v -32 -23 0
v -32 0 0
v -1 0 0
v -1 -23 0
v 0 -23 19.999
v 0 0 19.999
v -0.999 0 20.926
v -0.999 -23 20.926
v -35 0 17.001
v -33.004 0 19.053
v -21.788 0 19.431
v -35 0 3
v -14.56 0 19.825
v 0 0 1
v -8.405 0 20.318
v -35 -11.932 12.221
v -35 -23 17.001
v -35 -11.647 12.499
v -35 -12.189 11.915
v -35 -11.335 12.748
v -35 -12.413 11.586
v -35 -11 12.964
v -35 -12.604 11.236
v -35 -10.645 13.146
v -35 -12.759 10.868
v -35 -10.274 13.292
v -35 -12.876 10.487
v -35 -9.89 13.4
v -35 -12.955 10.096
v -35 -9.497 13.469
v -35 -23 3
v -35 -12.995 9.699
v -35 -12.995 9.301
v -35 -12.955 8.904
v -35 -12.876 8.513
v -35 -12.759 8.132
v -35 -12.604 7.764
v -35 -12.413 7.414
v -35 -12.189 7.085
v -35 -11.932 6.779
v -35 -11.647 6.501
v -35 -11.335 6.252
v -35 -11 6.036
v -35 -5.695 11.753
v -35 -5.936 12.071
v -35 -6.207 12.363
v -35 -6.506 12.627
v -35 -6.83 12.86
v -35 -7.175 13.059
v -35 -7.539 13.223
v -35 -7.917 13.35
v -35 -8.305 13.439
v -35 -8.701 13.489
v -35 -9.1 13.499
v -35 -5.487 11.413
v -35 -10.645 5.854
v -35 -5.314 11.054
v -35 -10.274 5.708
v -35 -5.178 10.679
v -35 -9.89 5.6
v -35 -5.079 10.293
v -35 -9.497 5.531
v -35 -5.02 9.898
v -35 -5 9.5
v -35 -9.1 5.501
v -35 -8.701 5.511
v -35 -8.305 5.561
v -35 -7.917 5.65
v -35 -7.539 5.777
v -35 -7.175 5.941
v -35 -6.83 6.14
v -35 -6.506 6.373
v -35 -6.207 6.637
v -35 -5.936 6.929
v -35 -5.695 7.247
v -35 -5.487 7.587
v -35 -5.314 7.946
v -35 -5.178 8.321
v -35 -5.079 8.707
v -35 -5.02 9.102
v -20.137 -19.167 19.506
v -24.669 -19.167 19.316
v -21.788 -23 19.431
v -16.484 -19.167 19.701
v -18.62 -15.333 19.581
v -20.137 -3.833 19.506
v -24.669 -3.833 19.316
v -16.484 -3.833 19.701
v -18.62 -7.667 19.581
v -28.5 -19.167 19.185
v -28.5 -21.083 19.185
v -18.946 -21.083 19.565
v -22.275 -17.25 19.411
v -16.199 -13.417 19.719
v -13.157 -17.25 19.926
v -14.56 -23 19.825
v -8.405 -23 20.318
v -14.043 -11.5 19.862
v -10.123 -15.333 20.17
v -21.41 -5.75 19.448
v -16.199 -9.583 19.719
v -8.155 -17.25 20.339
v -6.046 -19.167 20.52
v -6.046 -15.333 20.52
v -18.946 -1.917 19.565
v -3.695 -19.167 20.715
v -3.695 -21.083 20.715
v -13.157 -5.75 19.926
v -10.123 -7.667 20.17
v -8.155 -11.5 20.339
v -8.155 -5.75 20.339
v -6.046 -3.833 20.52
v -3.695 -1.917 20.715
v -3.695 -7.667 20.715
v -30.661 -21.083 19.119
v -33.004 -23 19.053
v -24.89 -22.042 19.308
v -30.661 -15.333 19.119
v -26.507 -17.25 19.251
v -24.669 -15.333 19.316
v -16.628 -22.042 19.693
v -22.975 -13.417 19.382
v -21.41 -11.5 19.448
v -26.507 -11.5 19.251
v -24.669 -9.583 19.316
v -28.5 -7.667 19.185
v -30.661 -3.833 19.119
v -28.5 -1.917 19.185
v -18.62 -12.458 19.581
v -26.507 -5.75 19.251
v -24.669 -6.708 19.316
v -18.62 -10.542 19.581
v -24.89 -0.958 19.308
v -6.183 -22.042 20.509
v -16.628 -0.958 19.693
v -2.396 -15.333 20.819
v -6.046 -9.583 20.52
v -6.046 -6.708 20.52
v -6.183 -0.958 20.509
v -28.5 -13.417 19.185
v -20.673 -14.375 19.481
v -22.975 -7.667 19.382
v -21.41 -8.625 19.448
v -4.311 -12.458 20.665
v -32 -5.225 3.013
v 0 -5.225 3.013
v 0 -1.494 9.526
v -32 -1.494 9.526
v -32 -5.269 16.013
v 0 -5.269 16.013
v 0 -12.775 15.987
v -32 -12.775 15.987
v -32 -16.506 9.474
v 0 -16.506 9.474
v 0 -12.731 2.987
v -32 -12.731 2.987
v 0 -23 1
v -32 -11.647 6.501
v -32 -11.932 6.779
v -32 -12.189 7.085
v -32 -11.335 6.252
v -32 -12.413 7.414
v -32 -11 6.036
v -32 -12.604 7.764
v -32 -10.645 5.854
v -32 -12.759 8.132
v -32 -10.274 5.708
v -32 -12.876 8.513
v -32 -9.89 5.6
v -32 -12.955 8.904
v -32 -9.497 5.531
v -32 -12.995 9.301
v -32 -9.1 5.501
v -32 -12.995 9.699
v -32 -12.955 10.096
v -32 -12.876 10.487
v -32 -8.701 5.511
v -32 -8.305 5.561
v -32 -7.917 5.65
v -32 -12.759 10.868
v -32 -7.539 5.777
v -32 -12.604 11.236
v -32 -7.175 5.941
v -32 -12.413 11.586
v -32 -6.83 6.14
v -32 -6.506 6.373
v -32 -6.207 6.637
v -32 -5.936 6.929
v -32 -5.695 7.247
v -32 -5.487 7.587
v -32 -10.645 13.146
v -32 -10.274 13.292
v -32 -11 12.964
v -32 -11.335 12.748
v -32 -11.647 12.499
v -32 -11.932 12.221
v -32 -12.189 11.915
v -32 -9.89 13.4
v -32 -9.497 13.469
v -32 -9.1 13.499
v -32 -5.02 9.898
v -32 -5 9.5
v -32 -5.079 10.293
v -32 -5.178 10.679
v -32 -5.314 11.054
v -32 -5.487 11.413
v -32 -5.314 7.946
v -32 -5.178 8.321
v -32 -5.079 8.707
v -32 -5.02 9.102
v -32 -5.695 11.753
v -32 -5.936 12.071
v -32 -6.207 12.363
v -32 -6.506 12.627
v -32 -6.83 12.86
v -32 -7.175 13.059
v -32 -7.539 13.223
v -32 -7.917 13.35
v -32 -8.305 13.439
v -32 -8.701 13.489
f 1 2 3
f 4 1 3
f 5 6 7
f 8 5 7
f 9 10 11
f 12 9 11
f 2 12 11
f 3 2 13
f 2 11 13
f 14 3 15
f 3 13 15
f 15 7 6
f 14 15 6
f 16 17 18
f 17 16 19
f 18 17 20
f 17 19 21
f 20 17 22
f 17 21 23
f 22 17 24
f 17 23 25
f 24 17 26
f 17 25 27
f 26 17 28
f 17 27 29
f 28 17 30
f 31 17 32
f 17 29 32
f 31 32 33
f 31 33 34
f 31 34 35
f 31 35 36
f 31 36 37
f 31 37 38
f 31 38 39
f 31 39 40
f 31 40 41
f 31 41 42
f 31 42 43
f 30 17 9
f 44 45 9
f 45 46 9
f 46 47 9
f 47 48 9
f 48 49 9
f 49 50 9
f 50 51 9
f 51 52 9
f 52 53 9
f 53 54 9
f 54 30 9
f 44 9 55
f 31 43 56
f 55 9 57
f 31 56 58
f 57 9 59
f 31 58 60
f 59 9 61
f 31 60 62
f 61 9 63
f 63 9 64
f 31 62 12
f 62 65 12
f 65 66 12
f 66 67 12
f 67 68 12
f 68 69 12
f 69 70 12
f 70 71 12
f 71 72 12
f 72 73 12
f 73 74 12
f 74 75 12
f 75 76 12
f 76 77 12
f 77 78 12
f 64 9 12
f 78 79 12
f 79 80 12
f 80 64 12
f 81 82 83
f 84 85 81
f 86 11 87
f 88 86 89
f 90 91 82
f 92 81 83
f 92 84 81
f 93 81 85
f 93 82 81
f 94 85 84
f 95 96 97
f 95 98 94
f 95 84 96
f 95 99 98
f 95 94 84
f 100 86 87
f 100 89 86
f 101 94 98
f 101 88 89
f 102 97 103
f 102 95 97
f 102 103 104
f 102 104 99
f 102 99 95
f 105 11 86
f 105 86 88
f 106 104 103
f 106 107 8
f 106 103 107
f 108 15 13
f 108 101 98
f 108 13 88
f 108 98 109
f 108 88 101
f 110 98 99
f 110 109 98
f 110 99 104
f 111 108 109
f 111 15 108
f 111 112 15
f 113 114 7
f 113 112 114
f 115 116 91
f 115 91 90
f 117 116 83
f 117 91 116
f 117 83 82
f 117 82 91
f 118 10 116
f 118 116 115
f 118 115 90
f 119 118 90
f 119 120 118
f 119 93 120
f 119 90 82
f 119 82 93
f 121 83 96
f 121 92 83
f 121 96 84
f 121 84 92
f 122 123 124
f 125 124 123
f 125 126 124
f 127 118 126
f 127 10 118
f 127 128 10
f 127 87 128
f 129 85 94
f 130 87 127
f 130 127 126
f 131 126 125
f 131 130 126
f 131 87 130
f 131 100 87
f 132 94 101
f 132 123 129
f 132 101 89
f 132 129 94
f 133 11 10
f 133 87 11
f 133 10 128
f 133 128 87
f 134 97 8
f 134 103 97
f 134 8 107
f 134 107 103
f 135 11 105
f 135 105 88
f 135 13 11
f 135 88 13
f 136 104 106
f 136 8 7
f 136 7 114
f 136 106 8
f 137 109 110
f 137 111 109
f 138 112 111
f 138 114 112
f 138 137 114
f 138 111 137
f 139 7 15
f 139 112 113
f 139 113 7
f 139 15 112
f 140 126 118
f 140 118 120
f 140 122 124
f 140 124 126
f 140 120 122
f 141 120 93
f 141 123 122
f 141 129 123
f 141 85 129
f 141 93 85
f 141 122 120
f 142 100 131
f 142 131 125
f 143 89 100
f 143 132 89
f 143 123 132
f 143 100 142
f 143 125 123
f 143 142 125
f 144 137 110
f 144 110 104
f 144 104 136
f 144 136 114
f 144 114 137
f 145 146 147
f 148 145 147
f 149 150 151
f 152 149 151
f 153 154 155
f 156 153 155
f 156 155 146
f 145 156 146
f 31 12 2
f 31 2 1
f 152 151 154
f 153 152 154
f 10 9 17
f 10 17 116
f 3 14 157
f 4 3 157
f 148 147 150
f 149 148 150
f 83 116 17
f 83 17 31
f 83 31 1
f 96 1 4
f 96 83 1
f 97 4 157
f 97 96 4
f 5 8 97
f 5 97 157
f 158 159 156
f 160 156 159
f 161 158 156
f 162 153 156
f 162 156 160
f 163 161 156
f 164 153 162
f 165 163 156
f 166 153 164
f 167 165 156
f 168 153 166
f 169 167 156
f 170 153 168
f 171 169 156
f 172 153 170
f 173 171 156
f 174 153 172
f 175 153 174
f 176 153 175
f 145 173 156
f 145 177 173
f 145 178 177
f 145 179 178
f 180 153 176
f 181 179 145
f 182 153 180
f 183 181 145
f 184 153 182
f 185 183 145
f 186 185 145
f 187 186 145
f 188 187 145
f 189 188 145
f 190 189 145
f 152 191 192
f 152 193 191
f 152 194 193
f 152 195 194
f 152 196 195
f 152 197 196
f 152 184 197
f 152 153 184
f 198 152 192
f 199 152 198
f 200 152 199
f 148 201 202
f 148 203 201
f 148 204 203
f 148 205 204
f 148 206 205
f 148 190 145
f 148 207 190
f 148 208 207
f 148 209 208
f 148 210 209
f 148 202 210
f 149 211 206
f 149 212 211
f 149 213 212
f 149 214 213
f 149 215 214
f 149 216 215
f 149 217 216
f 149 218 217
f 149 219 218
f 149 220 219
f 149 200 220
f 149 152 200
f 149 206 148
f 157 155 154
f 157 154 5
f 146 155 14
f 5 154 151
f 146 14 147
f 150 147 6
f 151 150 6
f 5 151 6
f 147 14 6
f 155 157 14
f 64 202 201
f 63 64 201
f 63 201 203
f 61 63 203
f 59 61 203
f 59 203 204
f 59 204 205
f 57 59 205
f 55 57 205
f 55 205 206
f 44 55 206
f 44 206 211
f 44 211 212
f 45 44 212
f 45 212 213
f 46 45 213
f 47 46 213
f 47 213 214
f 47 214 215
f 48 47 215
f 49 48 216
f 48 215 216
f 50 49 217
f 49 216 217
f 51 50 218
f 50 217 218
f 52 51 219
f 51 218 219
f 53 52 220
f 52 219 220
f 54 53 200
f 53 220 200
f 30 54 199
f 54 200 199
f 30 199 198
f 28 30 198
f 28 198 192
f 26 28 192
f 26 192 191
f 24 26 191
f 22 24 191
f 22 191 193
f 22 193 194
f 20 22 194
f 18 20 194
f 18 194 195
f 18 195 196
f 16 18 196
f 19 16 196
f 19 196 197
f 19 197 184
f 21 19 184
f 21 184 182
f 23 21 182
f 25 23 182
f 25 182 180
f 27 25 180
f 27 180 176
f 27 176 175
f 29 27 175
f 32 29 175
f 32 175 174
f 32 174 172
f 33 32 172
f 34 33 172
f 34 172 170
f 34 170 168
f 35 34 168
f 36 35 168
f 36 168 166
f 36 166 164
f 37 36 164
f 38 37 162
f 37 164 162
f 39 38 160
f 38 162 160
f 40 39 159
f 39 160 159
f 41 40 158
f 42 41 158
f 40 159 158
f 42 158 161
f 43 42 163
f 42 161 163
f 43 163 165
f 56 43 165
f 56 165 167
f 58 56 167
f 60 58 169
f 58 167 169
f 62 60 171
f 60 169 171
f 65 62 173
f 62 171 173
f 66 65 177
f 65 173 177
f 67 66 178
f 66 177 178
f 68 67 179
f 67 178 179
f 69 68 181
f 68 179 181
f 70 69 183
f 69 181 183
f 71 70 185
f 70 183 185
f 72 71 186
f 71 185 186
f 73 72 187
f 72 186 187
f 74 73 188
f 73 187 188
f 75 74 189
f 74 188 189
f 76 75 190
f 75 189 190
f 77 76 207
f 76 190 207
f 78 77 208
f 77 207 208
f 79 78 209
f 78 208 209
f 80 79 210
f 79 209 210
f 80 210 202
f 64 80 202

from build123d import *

# Parameters (mm, degrees)
F1_DEPTH    = 23
F2_R        = 4
F3_DEPTH    = 35.0010001
F5_DEPTH    = 32
F6_SIZE     = 1
F7_T1_DEPTH = 28.1474867513
F8_T1_DEPTH = 33.2835617863
F9_SIZE     = 3


# Not quite as in the source:
# - a fillet or chamfer that OpenCascade refuses, or shapes differently, is made with other operations: its cross-section is extruded or revolved along the edge and cut away or added


with BuildPart() as f1:
    # F0 (on Front) → F1 (new body)
    with BuildSketch(Plane.XZ):
        with BuildLine():
            Line((-35, 0), (0, 0))
            Line((0, 0), (0, 21))
            add(Edge.make_bspline(
                [(-35, 19), (-12.9749150947, 19.5710677654), (-12.9749150947, 20.0476832688), (0, 21)],
                knots=[0, 0, 0, 0, 35.0570962859, 35.0570962859, 35.0570962859, 35.0570962859], degree=3))
            Line((-35, 19), (-35, 0))
        make_face()
    extrude(amount=F1_DEPTH)

    # F2 (on Right) → F3 (cut, through all)
    with BuildSketch(Plane.YZ):
        with Locations((-9, 9.5)):
            Circle(F2_R)
    extrude(amount=-F3_DEPTH, mode=Mode.SUBTRACT)

    # F4 (on Right) → F5 (cut)
    with BuildSketch(Plane.YZ):
        Polygon((-5.225094273, 3.0128264948), (-1.4944900823, 9.5255775039), (-5.2693958093, 16.012751009), (-12.774905727, 15.9871735052), (-16.5055099177, 9.4744224961), (-12.7306041907, 2.987248991), align=None)
    extrude(amount=-F5_DEPTH, mode=Mode.SUBTRACT)

    # F6
    f6_edges = [f1.edges().sort_by_distance(p)[0] for p in [
        (0, -11.5, 0),
    ]]
    chamfer(f6_edges, length=F6_SIZE)

    # F7: chamfer of 1 on 1 edges, made by hand

    # F7_s2 → F7_t1 (cut)
    with BuildSketch(Plane.XZ.offset(-2.5737433757)):
        with BuildLine():
            Line((0.0293272632, 19.9718445491), (-1.0284200625, 20.9529152979))
            Line((-1.0284200625, 20.9529152979), (-1.0299222717, 20.9728588023))
            ThreePointArc((-1.0299222717, 20.9728588023), (-0.5146246013, 20.9820315927), (-0.0014639972, 21.0199463458))
            Line((-0.0014639972, 21.0199463458), (0.02, 21))
            ThreePointArc((0.02, 21), (0.02, 20.4859222745), (0.0493272632, 19.9718445491))
            Line((0.0493272632, 19.9718445491), (0.0293272632, 19.9718445491))
        make_face()
    extrude(amount=F7_T1_DEPTH, mode=Mode.SUBTRACT)

    # F8: chamfer of 2 on 1 edges, made by hand

    # F8_s2 → F8_t1 (cut)
    with BuildSketch(Plane.XZ.offset(-5.1417808931)):
        with BuildLine():
            Line((-35.0557899395, 16.944044455), (-32.9477944744, 19.1104787201))
            Line((-32.9477944744, 19.1104787201), (-32.9488880075, 19.1504637697))
            ThreePointArc((-32.9488880075, 19.1504637697), (-33.974209491, 19.0669652644), (-35.001036774, 19.0399865615))
            Line((-35.001036774, 19.0399865615), (-35.04, 19))
            ThreePointArc((-35.04, 19), (-35.04, 17.9720222275), (-35.0957899395, 16.944044455))
            Line((-35.0957899395, 16.944044455), (-35.0557899395, 16.944044455))
        make_face()
    extrude(amount=F8_T1_DEPTH, mode=Mode.SUBTRACT)

    # F9
    f9_edges = [f1.edges().sort_by_distance(p)[0] for p in [
        (-35, -11.5, 0),
    ]]
    chamfer(f9_edges, length=F9_SIZE)


solid = f1.part
